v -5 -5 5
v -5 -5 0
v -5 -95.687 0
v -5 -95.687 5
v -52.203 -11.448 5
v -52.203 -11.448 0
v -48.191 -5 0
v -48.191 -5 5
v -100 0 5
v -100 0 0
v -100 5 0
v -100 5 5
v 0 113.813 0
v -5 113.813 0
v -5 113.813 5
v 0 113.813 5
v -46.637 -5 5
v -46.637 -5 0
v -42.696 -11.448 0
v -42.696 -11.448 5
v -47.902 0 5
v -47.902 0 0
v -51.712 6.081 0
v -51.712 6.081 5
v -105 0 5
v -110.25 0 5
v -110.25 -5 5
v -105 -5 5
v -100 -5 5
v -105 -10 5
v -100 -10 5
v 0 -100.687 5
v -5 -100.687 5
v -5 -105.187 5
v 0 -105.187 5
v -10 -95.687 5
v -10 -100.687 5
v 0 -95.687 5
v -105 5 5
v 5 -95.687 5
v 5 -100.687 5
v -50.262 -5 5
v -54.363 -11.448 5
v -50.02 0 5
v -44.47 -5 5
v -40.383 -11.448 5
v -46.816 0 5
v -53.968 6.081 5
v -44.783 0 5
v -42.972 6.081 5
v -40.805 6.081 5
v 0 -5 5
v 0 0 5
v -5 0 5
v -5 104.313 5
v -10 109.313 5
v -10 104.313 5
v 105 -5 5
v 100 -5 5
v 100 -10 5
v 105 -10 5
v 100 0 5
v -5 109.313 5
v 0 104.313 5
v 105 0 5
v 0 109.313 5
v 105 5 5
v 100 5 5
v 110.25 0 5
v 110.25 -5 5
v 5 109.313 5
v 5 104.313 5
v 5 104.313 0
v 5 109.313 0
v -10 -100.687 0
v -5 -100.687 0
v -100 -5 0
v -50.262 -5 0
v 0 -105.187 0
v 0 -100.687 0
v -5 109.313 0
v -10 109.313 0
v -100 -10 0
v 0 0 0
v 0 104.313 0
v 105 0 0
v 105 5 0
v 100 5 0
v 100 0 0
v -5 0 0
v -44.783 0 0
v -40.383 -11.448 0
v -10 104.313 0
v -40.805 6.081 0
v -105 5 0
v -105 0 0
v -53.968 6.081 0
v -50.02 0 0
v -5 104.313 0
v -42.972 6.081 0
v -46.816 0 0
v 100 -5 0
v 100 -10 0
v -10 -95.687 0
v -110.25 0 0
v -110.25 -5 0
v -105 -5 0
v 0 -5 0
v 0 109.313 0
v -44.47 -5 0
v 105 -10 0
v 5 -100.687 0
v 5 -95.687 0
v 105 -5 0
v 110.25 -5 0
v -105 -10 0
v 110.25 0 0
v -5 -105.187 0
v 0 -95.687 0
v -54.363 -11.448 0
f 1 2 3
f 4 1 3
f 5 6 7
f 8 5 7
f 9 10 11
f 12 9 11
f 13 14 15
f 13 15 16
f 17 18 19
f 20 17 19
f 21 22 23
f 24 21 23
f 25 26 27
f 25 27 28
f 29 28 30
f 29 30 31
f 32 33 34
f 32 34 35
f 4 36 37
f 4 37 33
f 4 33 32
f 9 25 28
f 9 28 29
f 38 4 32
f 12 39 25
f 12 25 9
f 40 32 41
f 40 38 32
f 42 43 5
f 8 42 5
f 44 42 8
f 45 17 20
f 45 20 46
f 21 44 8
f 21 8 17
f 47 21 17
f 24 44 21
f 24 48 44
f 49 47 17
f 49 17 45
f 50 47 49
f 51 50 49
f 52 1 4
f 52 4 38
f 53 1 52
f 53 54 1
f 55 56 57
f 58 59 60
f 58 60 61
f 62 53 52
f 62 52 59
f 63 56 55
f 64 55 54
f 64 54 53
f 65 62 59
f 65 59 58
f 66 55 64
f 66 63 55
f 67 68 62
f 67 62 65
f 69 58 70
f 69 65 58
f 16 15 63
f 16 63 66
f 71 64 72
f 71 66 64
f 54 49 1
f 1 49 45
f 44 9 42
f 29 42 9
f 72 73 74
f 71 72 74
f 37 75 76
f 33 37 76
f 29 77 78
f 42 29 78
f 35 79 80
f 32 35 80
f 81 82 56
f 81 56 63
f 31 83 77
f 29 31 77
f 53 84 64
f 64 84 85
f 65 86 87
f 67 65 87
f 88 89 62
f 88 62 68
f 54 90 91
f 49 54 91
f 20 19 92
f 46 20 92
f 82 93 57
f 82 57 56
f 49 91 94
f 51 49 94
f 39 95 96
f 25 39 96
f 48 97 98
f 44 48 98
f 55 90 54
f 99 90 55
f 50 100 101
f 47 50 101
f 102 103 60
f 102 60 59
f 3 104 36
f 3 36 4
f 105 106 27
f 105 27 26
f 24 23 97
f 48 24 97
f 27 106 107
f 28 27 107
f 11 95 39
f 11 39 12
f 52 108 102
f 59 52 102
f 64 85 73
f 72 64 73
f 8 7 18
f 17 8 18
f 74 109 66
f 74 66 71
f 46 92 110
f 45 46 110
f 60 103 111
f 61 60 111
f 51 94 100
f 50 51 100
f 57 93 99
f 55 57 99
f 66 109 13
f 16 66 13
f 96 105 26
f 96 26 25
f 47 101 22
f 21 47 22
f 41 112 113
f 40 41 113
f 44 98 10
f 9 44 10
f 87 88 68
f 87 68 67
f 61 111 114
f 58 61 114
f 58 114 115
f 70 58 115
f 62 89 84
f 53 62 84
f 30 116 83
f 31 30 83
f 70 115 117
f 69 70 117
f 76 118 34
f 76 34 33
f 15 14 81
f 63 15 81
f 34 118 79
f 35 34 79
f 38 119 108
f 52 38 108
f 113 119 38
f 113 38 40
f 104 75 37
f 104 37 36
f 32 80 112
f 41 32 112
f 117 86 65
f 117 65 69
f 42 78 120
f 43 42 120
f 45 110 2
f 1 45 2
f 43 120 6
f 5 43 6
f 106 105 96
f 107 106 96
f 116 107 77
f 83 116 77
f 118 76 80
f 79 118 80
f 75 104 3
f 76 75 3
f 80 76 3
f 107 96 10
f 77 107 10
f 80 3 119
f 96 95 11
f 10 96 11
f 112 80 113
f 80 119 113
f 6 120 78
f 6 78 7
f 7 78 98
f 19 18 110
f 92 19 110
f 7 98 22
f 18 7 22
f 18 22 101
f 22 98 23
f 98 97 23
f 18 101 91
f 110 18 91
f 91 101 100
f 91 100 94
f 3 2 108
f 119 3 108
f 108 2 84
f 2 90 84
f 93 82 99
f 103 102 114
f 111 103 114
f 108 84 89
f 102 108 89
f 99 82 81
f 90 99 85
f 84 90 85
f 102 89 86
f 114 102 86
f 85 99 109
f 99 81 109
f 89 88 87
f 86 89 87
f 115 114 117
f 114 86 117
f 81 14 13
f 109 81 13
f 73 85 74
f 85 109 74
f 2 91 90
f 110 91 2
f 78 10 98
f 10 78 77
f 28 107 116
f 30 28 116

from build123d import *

# Parameters (mm, degrees)
F0_W     = 100
F0_H     = 5
F0_W_2   = 5
F0_W_3   = 5.25
F0_H_2   = 4.5
F0_H_3   = 104.3127122521
F0_H_4   = 90.6872877479
F1_DEPTH = 5


with BuildPart() as f1:
    # F0 (on Top) → F1 (new body)
    with BuildSketch(Plane.XY):
        with Locations((50, -2.5)):
            Rectangle(F0_W, F0_H)
        with Locations((102.5, -2.5)):
            Rectangle(F0_W_2, F0_H)
        with Locations((102.5, 2.5)):
            Rectangle(F0_W_2, F0_H)
        with Locations((102.5, -7.5)):
            Rectangle(F0_W_2, F0_H)
        with Locations((107.625, -2.5)):
            Rectangle(F0_W_3, F0_H)
        Polygon((-5, -5), (-5, 0), (-44.7830312261, 0), (-46.2334911863, -2.2172048721), (-44.4696663442, -5), align=None)
        with Locations((-2.5, 111.5627122521)):
            Rectangle(F0_W_2, F0_H_2)
        with Locations((-2.5, 106.8127122521)):
            Rectangle(F0_W_2, F0_H)
        with Locations((-7.5, 106.8127122521)):
            Rectangle(F0_W_2, F0_H)
        with Locations((2.5, 106.8127122521)):
            Rectangle(F0_W_2, F0_H)
        with Locations((-2.5, 52.1563561261)):
            Rectangle(F0_W_2, F0_H_3)
        with Locations((-2.5, -2.5)):
            Rectangle(F0_W_2, F0_H)
        with Locations((-2.5, -50.3436438739)):
            Rectangle(F0_W_2, F0_H_4)
        Polygon((-46.2334911863, -2.2172048721), (-44.7830312261, 0), (-46.8160055033, 0), (-47.3614148705, -0.862929156), (-47.9020566732, 0), (-50.0197165479, 0), (-48.535376256, -2.2862614242), (-50.2615776366, -5), (-48.1912470634, -5), (-47.4074525719, -3.7402854932), (-46.6374528634, -5), (-44.4696663442, -5), align=None)
        Polygon((-46.8160055033, 0), (-44.7830312261, 0), (-40.8048788968, 6.0810908044), (-42.9724873375, 6.0810908044), align=None)
        with Locations((-2.5, -98.1872877479)):
            Rectangle(F0_W_2, F0_H)
        with Locations((-7.5, -98.1872877479)):
            Rectangle(F0_W_2, F0_H)
        Polygon((-40.382866634, -11.4477640018), (-44.4696663442, -5), (-46.6374528634, -5), (-42.6962611291, -11.4477640018), align=None)
        Polygon((-47.3614148705, -0.862929156), (-46.8160055033, 0), (-47.9020566732, 0), align=None)
        with Locations((2.5, -98.1872877479)):
            Rectangle(F0_W_2, F0_H)
        with Locations((-2.5, -102.9372877479)):
            Rectangle(F0_W_2, F0_H_2)
        Polygon((-48.1912470634, -5), (-46.6374528634, -5), (-47.4074525719, -3.7402854932), align=None)
        Polygon((-50.0197165479, 0), (-47.9020566732, 0), (-51.7119776523, 6.0810908044), (-53.9678250207, 6.0810908044), align=None)
        Polygon((-52.2030464672, -11.4477640018), (-48.1912470634, -5), (-50.2615776366, -5), (-54.3629819576, -11.4477640018), align=None)
        Polygon((-48.535376256, -2.2862614242), (-50.0197165479, 0), (-100, 0), (-100, -5), (-50.2615776366, -5), align=None)
        with Locations((-102.5, -2.5)):
            Rectangle(F0_W_2, F0_H)
        with Locations((-102.5, 2.5)):
            Rectangle(F0_W_2, F0_H)
        with Locations((-102.5, -7.5)):
            Rectangle(F0_W_2, F0_H)
        with Locations((-107.625, -2.5)):
            Rectangle(F0_W_3, F0_H)
    extrude(amount=F1_DEPTH)


solid = f1.part
